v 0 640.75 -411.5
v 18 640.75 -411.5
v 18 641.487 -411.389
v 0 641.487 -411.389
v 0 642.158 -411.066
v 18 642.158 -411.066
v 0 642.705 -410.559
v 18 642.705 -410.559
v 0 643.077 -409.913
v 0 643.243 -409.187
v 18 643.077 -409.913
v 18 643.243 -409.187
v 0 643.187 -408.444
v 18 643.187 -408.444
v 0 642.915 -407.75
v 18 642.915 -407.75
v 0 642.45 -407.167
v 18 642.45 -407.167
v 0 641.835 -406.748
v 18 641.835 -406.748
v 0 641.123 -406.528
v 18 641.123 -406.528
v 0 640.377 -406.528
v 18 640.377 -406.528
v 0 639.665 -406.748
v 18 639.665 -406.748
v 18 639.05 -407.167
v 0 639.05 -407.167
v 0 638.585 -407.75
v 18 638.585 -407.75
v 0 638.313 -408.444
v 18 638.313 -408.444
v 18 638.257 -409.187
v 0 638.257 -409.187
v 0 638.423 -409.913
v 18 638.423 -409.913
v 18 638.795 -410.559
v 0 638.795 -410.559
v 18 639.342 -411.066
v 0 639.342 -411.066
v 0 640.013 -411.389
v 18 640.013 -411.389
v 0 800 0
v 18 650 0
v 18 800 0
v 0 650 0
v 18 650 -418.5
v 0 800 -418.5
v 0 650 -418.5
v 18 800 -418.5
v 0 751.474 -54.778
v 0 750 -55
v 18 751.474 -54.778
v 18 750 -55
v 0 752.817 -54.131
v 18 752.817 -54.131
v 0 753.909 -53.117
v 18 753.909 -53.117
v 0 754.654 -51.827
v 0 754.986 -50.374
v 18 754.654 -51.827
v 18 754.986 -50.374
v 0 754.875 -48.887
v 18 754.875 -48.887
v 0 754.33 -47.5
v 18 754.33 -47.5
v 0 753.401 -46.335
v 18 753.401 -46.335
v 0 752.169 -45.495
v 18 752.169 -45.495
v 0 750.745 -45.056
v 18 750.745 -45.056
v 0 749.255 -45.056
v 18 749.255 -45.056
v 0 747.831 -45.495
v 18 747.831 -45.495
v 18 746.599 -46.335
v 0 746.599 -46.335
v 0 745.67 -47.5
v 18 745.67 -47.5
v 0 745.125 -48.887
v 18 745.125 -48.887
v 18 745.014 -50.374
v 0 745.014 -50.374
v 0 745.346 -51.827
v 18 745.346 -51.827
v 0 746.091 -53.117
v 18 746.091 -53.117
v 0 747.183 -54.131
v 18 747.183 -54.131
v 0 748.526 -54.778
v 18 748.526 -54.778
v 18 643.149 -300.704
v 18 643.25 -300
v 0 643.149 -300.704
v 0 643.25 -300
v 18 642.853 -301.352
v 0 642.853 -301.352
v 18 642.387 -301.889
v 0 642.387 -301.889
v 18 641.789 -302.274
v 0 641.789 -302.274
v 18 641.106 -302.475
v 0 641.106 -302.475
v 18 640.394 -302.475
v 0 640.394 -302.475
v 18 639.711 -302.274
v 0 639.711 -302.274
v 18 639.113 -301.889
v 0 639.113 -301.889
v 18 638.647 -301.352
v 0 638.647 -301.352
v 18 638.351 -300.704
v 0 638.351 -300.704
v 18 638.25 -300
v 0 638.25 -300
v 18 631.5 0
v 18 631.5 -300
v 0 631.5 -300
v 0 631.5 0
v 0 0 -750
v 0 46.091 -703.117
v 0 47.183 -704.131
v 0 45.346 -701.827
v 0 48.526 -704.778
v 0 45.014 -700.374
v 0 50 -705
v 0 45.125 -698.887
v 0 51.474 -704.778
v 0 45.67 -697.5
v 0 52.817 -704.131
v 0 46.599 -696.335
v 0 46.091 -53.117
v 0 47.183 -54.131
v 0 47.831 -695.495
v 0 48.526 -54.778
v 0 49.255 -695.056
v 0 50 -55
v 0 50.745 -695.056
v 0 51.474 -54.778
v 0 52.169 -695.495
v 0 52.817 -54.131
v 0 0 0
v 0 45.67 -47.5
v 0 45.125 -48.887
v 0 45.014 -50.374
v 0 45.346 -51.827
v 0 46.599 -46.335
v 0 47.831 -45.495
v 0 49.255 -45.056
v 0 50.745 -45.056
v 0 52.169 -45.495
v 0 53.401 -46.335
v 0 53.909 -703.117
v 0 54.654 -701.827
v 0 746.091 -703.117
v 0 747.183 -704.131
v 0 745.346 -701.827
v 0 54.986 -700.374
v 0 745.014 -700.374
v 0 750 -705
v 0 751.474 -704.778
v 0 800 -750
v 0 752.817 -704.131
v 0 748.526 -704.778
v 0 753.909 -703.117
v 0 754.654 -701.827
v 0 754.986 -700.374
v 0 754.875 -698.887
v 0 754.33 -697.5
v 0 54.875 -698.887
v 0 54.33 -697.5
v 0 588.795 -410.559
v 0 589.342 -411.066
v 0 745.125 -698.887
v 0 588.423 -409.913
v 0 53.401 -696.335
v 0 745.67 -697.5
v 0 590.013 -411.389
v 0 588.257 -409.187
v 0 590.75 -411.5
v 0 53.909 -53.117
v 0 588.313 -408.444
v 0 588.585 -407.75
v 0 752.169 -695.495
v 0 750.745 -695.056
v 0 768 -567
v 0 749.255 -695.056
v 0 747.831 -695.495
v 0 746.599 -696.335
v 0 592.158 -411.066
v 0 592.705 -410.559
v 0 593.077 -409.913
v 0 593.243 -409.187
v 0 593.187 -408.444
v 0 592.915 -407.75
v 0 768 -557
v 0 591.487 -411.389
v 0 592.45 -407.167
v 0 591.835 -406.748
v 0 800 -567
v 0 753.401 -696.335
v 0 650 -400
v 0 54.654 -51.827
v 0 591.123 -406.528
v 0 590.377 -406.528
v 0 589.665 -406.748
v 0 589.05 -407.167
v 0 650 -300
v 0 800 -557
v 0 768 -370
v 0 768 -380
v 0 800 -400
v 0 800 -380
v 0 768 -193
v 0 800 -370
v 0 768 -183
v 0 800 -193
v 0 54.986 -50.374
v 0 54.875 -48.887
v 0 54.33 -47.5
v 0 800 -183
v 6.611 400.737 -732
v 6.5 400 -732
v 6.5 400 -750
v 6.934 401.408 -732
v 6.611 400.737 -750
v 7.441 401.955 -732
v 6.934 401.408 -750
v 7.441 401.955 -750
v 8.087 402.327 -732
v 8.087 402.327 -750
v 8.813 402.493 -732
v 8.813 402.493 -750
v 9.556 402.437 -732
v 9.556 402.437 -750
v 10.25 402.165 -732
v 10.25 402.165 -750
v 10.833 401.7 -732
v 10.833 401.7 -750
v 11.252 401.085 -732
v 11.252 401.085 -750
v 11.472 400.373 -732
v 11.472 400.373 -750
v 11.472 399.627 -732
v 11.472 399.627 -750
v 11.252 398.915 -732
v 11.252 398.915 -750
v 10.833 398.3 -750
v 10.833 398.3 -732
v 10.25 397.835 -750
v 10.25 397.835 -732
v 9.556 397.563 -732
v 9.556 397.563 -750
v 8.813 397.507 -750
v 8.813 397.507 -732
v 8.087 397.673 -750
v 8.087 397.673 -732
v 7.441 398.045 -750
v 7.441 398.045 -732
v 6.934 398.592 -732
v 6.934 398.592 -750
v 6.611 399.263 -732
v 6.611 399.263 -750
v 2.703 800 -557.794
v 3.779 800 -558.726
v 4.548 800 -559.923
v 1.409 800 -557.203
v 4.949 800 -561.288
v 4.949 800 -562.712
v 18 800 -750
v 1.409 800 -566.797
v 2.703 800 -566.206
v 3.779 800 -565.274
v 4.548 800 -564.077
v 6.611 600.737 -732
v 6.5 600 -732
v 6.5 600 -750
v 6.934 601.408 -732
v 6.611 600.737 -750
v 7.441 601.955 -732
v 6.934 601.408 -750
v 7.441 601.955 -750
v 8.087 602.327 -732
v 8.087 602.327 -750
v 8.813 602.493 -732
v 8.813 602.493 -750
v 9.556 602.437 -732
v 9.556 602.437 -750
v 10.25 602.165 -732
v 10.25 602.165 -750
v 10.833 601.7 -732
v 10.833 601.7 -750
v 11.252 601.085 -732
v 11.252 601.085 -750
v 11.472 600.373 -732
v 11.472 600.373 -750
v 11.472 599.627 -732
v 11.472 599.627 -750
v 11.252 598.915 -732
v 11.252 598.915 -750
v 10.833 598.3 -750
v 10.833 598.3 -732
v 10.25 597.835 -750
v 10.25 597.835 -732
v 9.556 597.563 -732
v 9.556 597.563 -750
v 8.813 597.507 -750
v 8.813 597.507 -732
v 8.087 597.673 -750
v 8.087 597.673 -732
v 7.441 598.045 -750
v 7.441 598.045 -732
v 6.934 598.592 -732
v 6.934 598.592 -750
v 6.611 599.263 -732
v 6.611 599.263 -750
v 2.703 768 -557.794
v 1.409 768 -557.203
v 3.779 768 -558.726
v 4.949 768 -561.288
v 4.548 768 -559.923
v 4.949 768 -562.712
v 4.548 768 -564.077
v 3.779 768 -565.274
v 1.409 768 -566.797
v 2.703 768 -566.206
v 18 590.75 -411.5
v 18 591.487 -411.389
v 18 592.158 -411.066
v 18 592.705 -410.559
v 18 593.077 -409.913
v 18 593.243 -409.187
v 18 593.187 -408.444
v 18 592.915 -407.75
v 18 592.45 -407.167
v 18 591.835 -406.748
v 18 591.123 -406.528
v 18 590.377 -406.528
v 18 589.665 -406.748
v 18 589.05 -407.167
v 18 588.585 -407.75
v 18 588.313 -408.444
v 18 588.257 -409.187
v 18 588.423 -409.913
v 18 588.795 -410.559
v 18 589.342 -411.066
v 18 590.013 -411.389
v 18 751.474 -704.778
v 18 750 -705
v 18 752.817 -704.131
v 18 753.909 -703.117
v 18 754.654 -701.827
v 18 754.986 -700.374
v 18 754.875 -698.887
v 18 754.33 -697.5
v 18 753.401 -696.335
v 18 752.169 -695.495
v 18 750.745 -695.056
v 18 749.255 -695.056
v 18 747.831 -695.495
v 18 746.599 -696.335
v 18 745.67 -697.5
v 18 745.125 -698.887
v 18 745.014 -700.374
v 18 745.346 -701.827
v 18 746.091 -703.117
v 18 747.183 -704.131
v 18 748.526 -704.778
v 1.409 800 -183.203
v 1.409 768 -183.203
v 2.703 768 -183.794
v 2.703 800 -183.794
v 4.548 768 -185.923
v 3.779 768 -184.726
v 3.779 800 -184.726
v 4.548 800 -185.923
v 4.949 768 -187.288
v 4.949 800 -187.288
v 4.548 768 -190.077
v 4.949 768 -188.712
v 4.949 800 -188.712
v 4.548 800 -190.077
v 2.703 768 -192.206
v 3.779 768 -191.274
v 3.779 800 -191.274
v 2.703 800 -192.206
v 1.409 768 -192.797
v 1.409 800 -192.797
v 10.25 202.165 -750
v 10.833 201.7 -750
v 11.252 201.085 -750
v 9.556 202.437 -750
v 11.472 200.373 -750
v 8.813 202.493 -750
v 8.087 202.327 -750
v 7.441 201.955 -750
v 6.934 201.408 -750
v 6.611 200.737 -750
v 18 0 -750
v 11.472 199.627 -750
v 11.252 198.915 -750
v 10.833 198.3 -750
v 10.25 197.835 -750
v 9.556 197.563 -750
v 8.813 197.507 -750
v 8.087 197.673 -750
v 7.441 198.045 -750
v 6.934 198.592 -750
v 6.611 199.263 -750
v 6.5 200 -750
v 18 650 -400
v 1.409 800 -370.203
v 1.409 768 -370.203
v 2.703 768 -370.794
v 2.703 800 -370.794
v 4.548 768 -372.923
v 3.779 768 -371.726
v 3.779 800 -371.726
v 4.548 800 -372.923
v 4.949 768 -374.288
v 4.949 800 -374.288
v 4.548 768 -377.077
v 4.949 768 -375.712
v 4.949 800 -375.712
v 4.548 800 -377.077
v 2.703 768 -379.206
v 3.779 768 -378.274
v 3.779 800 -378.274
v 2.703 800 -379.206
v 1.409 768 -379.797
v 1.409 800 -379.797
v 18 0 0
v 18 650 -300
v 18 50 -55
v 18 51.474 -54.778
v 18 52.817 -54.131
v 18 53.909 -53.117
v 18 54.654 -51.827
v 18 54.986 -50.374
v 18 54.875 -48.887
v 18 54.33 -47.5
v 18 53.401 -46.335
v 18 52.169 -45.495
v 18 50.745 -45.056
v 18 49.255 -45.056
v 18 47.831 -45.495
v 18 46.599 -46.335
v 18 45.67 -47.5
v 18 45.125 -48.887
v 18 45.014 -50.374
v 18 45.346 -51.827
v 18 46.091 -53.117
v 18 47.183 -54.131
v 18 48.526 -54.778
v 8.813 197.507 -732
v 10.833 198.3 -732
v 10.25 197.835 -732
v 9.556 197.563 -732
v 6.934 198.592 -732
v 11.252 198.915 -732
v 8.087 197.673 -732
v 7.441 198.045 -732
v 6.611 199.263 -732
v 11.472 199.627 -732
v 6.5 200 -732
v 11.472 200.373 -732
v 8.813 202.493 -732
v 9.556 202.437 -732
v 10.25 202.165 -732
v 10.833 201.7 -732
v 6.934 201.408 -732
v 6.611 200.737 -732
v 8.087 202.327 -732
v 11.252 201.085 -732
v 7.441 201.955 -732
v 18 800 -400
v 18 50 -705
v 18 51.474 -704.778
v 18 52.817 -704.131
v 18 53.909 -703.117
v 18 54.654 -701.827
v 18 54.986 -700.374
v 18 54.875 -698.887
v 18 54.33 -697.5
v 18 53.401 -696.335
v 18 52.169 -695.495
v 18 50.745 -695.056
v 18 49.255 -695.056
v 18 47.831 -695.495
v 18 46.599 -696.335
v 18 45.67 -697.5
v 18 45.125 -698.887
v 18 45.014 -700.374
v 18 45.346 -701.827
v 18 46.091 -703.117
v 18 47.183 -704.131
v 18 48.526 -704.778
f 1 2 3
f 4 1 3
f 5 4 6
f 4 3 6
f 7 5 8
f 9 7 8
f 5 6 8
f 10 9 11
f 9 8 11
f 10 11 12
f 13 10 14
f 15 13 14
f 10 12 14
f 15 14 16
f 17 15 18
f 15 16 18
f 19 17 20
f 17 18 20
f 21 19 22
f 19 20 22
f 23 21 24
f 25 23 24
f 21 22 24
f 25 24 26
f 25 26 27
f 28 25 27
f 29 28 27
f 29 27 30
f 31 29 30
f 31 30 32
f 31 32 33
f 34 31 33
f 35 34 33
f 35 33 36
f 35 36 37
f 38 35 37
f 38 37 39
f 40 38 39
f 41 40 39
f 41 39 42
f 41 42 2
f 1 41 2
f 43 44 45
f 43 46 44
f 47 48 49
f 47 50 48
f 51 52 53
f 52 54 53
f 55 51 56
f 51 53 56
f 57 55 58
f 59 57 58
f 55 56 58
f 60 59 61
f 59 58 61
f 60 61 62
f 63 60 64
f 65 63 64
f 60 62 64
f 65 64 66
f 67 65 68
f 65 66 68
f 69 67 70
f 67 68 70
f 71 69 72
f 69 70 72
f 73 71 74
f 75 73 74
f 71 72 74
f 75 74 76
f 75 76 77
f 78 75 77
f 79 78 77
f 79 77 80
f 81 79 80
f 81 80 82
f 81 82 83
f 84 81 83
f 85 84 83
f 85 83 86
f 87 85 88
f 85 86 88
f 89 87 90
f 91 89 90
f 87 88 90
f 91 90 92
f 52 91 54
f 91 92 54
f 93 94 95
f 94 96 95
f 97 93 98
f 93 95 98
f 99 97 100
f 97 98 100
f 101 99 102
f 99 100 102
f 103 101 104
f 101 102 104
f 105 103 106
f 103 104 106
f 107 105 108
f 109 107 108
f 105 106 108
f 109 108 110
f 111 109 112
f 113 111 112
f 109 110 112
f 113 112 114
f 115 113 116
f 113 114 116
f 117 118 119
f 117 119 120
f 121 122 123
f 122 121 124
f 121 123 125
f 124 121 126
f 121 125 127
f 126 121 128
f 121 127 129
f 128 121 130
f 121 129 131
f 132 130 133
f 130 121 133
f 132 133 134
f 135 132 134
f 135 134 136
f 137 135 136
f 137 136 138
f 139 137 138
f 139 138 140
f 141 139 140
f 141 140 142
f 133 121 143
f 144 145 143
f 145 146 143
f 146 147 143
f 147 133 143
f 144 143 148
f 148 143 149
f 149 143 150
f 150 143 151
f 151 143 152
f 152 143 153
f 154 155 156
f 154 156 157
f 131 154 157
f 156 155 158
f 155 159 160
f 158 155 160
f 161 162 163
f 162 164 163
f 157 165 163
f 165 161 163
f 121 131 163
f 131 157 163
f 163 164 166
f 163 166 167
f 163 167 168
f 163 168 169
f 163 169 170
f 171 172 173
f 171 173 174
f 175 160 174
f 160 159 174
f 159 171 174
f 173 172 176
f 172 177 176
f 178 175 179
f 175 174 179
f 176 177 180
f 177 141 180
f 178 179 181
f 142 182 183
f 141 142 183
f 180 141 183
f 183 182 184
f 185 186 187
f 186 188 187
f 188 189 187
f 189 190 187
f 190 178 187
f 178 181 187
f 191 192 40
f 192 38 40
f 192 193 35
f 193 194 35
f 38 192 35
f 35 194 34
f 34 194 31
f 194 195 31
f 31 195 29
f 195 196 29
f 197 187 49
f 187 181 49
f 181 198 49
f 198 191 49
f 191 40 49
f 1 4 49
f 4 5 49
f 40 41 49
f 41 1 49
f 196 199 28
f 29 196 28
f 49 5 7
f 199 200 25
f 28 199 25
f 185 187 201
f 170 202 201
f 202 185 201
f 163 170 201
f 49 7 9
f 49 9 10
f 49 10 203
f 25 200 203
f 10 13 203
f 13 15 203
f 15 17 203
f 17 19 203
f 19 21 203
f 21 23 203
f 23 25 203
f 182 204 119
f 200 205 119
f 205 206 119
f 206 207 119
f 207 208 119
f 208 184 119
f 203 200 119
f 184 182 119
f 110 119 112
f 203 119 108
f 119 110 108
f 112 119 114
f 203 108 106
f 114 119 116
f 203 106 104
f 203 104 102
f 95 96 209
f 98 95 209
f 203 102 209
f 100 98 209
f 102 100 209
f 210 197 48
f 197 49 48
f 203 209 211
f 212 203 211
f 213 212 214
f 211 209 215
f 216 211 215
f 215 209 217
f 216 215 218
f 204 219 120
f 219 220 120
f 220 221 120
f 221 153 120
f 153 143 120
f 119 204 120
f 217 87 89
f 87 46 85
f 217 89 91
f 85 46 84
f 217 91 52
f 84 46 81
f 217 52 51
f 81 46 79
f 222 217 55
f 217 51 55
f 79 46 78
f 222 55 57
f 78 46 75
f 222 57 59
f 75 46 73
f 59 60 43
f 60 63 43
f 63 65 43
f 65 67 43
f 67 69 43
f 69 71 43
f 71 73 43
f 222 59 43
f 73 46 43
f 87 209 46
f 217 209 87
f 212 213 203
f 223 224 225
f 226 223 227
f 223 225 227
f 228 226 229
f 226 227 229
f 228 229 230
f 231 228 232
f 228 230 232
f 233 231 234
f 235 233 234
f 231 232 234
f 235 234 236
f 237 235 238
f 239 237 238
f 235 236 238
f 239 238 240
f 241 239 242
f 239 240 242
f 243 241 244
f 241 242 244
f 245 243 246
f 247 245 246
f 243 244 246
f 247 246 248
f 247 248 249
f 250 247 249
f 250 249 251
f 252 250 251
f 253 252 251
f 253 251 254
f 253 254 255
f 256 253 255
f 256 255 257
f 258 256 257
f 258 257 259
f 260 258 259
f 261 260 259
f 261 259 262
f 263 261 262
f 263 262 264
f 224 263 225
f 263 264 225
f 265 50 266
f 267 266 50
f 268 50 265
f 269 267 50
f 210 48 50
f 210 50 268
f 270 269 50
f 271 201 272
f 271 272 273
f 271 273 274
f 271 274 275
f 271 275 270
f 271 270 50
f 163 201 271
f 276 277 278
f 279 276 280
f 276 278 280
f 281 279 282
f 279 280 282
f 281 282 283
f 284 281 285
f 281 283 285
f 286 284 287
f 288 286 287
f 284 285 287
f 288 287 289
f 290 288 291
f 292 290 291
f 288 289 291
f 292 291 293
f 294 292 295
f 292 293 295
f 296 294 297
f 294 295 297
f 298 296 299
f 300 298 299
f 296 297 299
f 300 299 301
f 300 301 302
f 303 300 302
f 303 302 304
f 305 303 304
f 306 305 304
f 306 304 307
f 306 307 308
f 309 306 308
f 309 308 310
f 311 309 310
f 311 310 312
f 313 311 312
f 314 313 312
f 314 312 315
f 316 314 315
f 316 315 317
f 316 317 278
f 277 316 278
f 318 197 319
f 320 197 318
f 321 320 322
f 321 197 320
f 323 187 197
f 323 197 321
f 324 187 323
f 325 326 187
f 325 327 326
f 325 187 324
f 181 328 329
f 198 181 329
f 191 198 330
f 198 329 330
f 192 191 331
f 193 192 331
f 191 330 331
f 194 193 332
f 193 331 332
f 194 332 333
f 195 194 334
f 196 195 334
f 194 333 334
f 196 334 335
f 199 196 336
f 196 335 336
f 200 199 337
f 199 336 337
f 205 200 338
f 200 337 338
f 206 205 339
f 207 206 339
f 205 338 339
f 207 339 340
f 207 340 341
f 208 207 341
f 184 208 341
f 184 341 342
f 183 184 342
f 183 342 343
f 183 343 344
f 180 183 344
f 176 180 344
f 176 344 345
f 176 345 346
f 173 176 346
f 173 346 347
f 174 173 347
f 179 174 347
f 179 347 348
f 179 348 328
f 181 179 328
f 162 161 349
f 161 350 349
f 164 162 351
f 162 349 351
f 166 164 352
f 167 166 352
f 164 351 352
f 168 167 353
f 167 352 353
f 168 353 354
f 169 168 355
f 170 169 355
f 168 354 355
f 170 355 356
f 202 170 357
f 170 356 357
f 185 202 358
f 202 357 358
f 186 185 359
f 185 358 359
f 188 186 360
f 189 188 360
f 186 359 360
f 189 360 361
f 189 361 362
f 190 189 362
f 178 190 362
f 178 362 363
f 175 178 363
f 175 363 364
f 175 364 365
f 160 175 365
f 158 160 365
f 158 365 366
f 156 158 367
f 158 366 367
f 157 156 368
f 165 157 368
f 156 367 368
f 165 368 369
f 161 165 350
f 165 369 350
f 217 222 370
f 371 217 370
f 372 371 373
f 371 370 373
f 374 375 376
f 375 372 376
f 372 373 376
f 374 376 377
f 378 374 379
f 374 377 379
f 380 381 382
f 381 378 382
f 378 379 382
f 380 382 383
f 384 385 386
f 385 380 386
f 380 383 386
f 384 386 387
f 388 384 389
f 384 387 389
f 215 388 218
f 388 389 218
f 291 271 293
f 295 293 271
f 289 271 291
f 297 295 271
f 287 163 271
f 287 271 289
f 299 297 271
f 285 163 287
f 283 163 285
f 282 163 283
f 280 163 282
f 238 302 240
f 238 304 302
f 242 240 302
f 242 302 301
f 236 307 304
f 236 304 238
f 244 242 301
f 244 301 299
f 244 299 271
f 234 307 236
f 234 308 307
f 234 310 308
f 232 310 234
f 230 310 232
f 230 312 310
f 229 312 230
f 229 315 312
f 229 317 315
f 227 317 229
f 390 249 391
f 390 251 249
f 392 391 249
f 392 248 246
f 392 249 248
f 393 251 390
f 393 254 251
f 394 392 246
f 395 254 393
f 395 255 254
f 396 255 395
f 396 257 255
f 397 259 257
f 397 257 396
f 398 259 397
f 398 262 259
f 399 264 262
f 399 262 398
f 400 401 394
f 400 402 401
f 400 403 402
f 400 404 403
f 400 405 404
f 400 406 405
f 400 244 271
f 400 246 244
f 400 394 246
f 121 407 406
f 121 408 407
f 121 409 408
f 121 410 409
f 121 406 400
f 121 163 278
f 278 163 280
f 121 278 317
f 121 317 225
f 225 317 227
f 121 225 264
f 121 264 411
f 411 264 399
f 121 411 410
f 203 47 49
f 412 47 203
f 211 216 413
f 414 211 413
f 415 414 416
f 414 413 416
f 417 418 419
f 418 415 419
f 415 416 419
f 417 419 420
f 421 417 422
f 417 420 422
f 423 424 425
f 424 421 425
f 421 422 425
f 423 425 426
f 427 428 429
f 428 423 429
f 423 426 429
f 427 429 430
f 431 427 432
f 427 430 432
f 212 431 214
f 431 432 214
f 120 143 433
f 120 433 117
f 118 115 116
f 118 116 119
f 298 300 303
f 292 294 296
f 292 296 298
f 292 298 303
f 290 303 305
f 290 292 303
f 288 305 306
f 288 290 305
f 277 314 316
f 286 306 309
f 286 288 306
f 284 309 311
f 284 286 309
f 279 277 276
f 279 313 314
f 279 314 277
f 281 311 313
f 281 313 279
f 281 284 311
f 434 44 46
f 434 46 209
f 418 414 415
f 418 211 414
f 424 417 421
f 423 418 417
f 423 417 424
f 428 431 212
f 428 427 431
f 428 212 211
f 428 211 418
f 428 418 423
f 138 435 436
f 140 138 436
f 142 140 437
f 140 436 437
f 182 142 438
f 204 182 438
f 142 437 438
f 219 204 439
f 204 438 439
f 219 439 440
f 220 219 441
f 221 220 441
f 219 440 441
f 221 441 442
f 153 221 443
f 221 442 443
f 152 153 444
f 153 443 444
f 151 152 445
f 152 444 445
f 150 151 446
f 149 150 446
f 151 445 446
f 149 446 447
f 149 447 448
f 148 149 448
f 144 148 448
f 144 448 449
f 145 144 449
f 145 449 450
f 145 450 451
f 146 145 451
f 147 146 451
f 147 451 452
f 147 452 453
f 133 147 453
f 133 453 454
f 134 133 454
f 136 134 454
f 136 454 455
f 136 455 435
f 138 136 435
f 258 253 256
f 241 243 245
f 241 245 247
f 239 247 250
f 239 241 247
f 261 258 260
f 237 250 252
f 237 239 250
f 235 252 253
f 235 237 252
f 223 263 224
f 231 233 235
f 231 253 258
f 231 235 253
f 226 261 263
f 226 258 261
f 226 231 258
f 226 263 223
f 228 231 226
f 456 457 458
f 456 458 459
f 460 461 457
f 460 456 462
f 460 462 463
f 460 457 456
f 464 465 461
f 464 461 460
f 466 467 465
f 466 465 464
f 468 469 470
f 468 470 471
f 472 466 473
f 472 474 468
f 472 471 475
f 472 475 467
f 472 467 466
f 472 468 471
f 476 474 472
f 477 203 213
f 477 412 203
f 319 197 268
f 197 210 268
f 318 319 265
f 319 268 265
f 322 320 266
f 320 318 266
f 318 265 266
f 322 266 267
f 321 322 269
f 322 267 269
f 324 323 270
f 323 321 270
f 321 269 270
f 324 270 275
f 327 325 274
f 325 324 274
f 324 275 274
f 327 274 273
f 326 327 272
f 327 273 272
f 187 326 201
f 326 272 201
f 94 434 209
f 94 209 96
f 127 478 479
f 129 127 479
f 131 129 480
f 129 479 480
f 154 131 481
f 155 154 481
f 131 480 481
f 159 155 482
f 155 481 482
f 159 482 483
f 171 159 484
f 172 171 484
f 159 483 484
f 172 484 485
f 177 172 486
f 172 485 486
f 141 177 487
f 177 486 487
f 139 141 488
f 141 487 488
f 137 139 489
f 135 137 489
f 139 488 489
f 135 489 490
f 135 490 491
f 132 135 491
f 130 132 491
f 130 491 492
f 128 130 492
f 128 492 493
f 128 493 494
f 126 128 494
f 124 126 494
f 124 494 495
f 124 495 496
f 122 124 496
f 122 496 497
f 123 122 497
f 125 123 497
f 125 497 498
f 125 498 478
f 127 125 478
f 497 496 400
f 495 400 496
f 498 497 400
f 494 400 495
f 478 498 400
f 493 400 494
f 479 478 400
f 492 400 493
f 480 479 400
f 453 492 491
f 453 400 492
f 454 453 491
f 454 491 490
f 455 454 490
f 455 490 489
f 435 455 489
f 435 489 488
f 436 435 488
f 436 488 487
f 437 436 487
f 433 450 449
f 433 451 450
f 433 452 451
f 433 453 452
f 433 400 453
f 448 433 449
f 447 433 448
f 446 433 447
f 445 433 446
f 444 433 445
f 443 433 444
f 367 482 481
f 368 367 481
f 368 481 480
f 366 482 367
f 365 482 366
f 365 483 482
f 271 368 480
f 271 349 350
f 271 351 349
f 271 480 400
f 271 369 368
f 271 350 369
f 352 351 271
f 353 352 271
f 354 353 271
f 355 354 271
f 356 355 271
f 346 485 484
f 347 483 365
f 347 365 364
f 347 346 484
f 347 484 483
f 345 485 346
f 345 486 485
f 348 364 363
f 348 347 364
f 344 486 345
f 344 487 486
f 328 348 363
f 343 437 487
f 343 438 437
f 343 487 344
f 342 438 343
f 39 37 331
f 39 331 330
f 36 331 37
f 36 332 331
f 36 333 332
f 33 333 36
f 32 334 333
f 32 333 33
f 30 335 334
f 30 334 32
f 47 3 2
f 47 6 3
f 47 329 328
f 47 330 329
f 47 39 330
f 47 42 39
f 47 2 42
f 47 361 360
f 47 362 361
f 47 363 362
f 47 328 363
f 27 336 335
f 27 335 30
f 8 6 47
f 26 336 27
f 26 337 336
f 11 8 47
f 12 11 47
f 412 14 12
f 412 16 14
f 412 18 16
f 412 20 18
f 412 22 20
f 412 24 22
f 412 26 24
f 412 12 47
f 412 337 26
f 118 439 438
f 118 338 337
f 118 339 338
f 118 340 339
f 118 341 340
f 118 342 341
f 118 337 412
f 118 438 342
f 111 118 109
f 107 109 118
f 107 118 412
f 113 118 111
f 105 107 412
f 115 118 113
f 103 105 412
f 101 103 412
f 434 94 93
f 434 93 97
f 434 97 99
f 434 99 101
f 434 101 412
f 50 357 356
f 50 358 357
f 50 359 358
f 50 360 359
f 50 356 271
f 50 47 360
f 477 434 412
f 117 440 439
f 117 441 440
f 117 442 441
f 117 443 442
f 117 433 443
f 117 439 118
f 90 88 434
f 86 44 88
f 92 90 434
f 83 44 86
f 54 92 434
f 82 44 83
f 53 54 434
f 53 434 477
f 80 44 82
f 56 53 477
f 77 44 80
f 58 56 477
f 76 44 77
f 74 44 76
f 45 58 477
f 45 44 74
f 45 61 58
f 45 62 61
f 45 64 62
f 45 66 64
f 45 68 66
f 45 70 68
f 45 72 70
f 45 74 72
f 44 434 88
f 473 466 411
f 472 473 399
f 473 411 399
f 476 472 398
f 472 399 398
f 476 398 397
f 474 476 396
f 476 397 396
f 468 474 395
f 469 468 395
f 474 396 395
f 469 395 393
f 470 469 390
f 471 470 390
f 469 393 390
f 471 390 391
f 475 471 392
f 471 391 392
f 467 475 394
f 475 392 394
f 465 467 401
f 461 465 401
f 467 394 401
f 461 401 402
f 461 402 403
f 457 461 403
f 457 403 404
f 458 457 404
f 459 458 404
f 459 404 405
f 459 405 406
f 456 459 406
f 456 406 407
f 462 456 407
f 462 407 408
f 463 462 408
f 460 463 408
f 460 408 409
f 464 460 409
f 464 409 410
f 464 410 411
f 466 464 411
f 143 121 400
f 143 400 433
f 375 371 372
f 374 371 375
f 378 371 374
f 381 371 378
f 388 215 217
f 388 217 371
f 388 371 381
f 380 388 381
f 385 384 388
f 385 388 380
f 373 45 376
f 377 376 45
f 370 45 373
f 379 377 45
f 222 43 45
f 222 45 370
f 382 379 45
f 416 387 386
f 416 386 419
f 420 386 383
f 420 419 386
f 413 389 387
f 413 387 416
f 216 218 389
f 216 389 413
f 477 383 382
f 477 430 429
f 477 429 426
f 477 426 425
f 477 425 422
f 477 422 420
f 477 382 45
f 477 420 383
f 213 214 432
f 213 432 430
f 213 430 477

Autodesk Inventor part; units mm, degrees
ref_plane "YZ Plane" through (0, 0, 0) normal (1, 0, 0) x (0, 1, 0)
ref_plane "XZ Plane" through (0, 0, 0) normal (0, 1, 0) x (-1, 0, 0)
ref_plane "XY Plane" through (0, 0, 0) normal (0, 0, 1) x (1, 0, 0)
sketch "Sketch1" plane through (0, 0, 0) normal (1, 0, 0) x (0, 1, 0)
  line L0 (0, 0) -> (800, 0)
  line L1 (800, 0) -> (800, -750)
  line L2 (800, -750) -> (0, -750)
  line L3 (0, -750) -> (0, 0)
  dimension "d0" = 800
  dimension "d1" = 750
extrude "Extrusion1" add sketch "Sketch1" along normal blind 18
sketch "Sketch2" plane through (18, 0, 0) normal (1, 0, 0) x (0, 0, -1)
  line L0 (0, 800) -> (0, 0) projected
  line L1 (750, 800) -> (0, 800) projected
  line L2 (400, 800) -> (418.5, 800)
  line L3 (418.5, 800) -> (418.5, 650)
  line L4 (418.5, 650) -> (400, 650)
  line L5 (400, 650) -> (400, 800)
  line L6 (0, 650) -> (300, 650)
  line L7 (300, 650) -> (300, 631.5)
  line L8 (300, 631.5) -> (0, 631.5)
  line L9 (0, 631.5) -> (0, 650)
  dimension "d4" = 400
  dimension "d5" = 18.5
  dimension "d6" = 150
  dimension "d7" = 300
  dimension "d8" = 18.5
extrude "Extrusion2" cut sketch "Sketch2" against normal blind 18
sketch "Sketch3" plane through (18, 0, 0) normal (1, 0, 0) x (0, 0, -1)
  circle A0 centre (50, 750) radius 5
  circle A1 centre (700, 750) radius 5
  circle A2 centre (700, 50) radius 5
  circle A3 centre (50, 50) radius 5
  point P0 (0, 0)
  point P1 (0, 800)
sketch "Sketch4" plane through (0, 800, -750) normal (0, 1, 0) x (1, 0, 0)
  circle A0 centre (0, -188) radius 5
  circle A1 centre (0, -375) radius 5
  circle A2 centre (0, -562) radius 5
  point P0 (0, -750)
  dimension "d25" = 10
  dimension "d26" = 10
  dimension "d27" = 10
extrude "Extrusion3" cut sketch "Sketch4" against normal blind 32
thread "Thread1" size "M10x1.5" class "6H" standard "ANSI Metric M Profile" full length
thread "Thread2" size "M10x1.5" class "6H" standard "ANSI Metric M Profile" full length
thread "Thread3" size "M10x1.5" class "6H" standard "ANSI Metric M Profile" full length
sketch "Sketch5" plane through (0, 0, -750) normal (0, 0, -1) x (-1, 0, 0)
  line L0 (0, 0) -> (-9, 0)
  line L1 (0, 0) -> (-18, 0) projected
  circle A0 centre (-9, 600) radius 2.5
  circle A1 centre (-9, 200) radius 2.5
  circle A2 centre (-9, 400) radius 2.5
  dimension "d41" = 9
  dimension "d48" = 5
  dimension "d49" = 5
  dimension "d50" = 5
extrude "Extrusion4" cut sketch "Sketch5" against normal blind 18
extrude "Extrusion5" cut sketch "Sketch3" against normal blind 18
sketch "Sketch6" plane through (0, 0, 0) normal (-1, 0, 0) x (0, 0, 1)
  circle A0 centre (-300, 640.75) radius 2.5
  point P0 (0, 0)
  point P1 (-300, 631.5)
  dimension "d56" = 5
extrude "Extrusion6" cut sketch "Sketch6" against normal blind 18
sketch "Sketch7" plane through (18, 0, 0) normal (1, 0, 0) x (0, 0, -1)
  point P0 (0, 0)
sketch "Sketch8" plane through (18, 0, 0) normal (1, 0, 0) x (0, 0, -1)
  arc A0 (300, 638.25) -> (300, 643.25) centre (300, 640.75) ccw projected
  line L0 (300, 640.75) -> (409, 640.75) construction
  circle A1 centre (409, 640.75) radius 2.5
  circle A2 centre (409, 590.75) radius 2.5
  point P0 (0, 0)
  dimension "d62" = 5
  dimension "d63" = 5
extrude "Extrusion7" cut sketch "Sketch8" against normal blind 59.2125
sketch "Sketch9" plane through (18, 0, 0) normal (1, 0, 0) x (0, 0, -1)
  point P0 (0, 0)
properties part number "wallL1" material "MDF Medium Density Fiberboard"
